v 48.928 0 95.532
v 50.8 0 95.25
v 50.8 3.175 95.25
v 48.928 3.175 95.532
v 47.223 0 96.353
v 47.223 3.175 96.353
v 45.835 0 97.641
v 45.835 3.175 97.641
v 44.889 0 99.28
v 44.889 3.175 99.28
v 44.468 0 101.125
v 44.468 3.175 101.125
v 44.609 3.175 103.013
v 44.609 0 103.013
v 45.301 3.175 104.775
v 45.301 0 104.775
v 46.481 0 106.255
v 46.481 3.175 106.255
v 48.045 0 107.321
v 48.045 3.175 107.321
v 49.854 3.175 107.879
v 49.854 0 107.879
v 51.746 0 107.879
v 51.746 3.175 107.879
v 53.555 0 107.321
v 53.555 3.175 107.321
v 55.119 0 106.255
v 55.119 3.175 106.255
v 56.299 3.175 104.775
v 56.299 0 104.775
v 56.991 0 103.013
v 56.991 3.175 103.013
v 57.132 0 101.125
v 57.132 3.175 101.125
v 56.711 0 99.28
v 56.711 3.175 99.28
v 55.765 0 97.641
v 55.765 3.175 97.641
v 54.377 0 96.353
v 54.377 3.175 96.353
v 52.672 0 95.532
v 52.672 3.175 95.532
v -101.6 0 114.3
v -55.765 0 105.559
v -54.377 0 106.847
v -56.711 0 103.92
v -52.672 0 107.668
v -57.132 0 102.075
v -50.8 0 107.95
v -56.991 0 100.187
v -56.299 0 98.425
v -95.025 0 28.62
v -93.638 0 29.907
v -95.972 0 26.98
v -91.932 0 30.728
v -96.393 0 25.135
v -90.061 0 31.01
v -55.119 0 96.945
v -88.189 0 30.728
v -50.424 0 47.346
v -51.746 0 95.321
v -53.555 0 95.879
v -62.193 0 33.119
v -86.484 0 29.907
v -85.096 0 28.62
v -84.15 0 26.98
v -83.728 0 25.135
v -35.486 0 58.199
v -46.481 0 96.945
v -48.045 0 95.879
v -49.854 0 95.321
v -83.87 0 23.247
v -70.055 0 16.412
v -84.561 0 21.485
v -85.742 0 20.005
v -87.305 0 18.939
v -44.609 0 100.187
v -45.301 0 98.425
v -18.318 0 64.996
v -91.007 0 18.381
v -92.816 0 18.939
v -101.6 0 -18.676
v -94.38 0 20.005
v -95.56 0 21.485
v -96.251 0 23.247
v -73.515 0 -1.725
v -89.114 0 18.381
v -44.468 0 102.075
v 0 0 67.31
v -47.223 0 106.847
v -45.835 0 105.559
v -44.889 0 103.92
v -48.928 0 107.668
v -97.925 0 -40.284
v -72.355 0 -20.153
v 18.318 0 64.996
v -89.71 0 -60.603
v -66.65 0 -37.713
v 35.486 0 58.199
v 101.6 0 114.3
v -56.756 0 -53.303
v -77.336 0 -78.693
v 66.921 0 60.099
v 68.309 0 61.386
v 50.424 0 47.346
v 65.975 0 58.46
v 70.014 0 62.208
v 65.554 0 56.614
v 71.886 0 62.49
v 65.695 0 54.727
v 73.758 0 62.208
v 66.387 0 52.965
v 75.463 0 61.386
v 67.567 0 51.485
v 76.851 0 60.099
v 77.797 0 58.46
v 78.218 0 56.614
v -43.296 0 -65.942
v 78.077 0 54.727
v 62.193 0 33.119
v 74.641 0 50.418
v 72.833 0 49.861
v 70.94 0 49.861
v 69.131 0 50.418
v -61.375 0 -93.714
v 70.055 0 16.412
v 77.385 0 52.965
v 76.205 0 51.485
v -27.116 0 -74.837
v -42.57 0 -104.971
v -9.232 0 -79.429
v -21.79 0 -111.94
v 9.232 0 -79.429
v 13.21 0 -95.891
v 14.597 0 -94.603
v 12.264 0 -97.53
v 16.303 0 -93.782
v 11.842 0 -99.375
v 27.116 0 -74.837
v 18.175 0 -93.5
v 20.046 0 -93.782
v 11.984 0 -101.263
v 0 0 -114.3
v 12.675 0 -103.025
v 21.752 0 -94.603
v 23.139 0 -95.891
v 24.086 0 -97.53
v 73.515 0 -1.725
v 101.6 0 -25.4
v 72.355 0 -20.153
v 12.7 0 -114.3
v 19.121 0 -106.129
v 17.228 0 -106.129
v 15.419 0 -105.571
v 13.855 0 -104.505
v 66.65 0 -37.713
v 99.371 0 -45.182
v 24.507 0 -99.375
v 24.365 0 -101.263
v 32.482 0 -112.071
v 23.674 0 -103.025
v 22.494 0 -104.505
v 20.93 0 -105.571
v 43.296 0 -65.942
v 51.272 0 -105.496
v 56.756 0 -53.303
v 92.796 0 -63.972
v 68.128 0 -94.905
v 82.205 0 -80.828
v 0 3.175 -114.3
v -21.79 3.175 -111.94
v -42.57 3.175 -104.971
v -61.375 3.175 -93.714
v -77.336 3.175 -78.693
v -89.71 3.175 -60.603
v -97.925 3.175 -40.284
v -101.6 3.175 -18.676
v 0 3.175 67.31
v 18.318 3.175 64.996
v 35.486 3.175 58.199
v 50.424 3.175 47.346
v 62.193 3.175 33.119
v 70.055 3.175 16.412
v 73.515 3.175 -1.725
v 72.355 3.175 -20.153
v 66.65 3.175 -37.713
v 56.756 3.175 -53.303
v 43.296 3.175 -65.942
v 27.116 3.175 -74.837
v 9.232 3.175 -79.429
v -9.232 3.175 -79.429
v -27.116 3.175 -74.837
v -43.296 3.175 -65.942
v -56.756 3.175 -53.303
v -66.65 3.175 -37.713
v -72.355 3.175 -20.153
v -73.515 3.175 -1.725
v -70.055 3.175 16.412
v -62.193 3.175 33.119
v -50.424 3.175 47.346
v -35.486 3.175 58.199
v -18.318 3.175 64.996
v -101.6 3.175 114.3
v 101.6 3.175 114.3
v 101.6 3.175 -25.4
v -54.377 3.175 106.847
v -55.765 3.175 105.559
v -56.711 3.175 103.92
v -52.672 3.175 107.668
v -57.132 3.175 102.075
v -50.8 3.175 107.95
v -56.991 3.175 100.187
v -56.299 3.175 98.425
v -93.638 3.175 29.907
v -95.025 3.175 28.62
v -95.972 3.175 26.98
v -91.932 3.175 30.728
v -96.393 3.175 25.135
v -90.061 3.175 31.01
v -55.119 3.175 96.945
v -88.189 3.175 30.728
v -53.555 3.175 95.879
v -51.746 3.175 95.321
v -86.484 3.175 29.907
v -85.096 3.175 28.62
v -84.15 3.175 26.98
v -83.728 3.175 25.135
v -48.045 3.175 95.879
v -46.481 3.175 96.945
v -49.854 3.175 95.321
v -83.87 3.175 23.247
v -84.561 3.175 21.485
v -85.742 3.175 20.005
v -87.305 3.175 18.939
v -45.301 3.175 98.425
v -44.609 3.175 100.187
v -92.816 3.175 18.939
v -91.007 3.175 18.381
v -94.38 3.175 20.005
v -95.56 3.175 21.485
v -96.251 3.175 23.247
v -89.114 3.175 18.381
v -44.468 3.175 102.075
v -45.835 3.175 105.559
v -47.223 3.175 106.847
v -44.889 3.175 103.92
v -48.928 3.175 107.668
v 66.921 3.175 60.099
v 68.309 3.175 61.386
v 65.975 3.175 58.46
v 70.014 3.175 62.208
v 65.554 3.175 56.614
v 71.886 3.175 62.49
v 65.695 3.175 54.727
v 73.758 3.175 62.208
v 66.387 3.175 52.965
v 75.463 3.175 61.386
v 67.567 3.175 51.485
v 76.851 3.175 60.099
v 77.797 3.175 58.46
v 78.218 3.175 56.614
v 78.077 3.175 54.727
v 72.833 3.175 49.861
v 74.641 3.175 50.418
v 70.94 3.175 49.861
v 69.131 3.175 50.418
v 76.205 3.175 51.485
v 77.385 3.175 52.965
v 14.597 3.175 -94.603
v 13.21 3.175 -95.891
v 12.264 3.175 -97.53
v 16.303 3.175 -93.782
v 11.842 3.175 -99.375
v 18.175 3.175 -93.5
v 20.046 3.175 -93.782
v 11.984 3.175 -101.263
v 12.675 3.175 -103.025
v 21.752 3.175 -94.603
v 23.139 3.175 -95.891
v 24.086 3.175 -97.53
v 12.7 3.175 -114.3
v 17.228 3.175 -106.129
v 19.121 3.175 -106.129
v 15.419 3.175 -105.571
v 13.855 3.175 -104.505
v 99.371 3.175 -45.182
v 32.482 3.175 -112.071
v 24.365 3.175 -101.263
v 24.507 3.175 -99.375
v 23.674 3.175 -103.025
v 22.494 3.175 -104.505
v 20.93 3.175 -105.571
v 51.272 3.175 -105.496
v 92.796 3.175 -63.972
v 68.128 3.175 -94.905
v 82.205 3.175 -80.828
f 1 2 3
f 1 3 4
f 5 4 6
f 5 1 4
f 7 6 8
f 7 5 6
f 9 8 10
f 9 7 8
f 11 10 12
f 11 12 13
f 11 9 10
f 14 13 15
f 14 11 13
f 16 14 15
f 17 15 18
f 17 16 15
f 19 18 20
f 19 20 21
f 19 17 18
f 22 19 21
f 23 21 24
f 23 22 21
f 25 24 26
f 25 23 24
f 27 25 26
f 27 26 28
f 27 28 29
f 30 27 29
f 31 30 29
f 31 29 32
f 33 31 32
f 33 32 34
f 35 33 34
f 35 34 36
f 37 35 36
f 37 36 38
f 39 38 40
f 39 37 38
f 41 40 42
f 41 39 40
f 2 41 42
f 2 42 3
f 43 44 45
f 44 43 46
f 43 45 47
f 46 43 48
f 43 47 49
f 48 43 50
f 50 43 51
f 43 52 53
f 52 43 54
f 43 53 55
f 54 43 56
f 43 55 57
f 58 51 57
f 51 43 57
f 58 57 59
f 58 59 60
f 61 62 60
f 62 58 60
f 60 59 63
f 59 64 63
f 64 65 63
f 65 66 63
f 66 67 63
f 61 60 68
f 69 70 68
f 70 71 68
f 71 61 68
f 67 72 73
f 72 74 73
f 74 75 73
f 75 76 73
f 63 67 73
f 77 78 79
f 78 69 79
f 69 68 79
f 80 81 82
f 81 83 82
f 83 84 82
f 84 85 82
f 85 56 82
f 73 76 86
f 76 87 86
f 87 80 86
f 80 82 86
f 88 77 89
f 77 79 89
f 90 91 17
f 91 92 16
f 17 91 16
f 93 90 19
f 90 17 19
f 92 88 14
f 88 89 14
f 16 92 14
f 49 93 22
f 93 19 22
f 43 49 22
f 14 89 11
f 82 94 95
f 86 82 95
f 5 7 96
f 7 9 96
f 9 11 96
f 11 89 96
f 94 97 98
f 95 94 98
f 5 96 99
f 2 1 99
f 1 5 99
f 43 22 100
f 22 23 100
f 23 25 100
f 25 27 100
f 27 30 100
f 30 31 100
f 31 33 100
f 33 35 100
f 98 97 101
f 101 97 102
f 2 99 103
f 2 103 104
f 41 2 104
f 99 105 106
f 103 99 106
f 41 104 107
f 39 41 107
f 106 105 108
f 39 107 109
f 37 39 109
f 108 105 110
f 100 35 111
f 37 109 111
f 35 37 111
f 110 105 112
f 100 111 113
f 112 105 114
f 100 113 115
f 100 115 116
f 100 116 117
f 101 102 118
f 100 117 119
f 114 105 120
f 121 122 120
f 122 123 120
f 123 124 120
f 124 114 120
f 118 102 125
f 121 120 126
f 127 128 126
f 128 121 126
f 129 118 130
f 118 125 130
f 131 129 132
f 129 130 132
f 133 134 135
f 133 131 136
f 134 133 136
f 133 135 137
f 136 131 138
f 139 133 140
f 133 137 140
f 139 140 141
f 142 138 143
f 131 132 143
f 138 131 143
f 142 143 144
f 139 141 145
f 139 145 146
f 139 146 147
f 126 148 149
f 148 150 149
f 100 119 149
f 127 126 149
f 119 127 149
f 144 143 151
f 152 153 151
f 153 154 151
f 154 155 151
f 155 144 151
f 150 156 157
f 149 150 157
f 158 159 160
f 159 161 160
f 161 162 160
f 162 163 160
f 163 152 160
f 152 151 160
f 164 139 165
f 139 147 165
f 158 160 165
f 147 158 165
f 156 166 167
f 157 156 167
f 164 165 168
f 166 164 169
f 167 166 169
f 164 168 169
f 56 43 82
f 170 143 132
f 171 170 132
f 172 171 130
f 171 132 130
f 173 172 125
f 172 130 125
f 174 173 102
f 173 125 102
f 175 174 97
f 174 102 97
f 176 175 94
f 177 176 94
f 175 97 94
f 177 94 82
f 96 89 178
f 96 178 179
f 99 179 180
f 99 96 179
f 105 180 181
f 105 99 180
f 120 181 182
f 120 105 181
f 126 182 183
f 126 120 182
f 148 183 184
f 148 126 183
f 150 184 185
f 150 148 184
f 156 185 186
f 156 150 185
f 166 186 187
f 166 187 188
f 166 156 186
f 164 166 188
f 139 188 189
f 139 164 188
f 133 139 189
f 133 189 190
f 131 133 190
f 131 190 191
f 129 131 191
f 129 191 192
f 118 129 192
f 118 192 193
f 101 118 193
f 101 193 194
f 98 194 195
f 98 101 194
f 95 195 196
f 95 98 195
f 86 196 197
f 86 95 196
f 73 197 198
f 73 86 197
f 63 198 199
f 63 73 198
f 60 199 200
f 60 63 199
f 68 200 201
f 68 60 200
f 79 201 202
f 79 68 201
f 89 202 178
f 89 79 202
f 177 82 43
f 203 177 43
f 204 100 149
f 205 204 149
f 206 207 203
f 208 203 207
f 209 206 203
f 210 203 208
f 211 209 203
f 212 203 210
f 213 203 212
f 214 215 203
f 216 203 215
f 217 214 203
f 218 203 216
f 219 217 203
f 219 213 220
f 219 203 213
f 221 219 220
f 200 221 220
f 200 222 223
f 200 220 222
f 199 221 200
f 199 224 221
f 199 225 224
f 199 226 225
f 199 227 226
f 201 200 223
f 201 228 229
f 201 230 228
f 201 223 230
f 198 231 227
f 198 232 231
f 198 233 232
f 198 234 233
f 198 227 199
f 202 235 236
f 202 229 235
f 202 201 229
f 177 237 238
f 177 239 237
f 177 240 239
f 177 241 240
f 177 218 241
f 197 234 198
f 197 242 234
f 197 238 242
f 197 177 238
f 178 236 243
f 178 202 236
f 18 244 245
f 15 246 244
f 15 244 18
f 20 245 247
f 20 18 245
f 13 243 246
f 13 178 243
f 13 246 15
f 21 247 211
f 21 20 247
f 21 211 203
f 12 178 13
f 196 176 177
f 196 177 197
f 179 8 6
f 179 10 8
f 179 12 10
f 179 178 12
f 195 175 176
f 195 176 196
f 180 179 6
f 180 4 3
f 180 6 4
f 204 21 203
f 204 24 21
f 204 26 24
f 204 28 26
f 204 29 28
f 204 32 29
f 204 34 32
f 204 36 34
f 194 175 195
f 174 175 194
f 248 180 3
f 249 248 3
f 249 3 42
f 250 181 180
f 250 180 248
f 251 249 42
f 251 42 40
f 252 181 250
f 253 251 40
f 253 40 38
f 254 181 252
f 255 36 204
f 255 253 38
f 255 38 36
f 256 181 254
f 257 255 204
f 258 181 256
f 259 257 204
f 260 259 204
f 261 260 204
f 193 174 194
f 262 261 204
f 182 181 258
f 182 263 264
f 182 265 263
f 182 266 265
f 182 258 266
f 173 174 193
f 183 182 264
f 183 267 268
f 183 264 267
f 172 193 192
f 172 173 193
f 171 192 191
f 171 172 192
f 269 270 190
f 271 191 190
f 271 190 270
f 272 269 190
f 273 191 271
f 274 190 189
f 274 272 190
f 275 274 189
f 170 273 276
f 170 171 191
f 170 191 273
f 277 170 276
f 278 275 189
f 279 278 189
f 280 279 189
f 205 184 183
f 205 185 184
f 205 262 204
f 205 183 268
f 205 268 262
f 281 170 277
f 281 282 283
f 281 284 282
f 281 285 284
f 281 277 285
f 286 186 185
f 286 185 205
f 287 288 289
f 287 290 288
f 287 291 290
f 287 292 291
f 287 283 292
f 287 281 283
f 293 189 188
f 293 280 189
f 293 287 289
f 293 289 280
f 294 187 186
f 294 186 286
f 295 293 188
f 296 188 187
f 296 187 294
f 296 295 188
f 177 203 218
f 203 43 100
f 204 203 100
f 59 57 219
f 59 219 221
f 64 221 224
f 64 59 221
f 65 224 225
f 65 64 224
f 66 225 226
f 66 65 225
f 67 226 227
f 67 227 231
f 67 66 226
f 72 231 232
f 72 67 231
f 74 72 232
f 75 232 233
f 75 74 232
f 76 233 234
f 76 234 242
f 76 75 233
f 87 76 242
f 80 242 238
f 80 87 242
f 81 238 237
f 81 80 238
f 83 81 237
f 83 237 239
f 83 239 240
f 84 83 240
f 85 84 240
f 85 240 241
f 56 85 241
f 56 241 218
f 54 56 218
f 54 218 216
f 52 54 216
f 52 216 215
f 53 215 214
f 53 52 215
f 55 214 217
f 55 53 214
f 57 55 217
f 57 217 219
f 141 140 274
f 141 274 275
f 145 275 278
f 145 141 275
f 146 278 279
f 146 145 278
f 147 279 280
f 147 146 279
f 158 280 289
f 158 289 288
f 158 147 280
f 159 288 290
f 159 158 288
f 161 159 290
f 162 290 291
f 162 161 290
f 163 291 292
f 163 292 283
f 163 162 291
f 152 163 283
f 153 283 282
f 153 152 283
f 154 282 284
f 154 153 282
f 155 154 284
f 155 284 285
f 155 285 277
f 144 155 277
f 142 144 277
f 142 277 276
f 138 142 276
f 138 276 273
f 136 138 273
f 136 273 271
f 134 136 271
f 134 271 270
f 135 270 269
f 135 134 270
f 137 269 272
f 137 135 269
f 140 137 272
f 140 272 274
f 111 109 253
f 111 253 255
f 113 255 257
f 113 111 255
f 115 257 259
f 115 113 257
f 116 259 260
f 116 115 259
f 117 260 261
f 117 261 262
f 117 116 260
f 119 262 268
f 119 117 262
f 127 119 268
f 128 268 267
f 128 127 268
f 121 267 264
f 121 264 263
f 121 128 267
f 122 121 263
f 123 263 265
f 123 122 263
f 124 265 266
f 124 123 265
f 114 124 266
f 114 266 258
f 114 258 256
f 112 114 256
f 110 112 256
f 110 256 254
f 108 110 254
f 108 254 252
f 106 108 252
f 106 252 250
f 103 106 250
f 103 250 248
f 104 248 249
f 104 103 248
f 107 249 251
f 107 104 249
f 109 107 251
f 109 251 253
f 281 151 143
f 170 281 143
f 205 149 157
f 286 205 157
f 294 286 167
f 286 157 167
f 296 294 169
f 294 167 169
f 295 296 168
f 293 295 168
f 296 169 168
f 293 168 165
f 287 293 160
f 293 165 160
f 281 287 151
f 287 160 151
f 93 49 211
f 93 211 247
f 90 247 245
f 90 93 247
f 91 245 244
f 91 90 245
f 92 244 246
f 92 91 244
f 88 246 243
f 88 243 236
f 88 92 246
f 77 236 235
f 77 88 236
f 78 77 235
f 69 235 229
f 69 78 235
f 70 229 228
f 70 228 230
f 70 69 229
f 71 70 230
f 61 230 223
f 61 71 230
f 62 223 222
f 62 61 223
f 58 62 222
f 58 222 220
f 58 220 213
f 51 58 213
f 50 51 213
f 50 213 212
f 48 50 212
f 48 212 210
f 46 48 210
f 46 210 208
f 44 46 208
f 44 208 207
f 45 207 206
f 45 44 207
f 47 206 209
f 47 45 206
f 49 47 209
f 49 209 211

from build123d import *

# Parameters (mm, degrees)
SKETCH1_R           = 73.66
SKETCH1_R_2         = 6.35
BOSS_EXTRUDE1_DEPTH = 3.175


with BuildPart() as part:
    # Sketch1 → Boss-Extrude1 (new body)
    with BuildSketch(Plane(origin=(0, 0, 0), x_dir=(1, 0, 0), z_dir=(0, 1, 0))):
        with BuildLine():
            Line((12.7, 114.3), (0, 114.3))
            ThreePointArc((0, 114.3), (-69.761055355, 86.634356609), (-101.6, 18.676470588))
            Line((-101.6, 18.676470588), (-101.6, -114.3))
            Line((-101.6, -114.3), (101.6, -114.3))
            Line((101.6, -114.3), (101.6, 25.4))
            ThreePointArc((101.6, 25.4), (75.561792847, 88.261792847), (12.7, 114.3))
        make_face()
        with Locations(Location((0, 6.35, 0), (0, 0, 270))):
            Circle(SKETCH1_R, mode=Mode.SUBTRACT)
        with Locations(Location((-90.060644326, -24.660366712, 0), (0, 0, 270))):
            Circle(SKETCH1_R_2, mode=Mode.SUBTRACT)
        with Locations(Location((-50.8, -101.6, 0), (0, 0, 270))):
            Circle(SKETCH1_R_2, mode=Mode.SUBTRACT)
        with Locations(Location((50.8, -101.6, 0), (0, 0, 90))):
            Circle(SKETCH1_R_2, mode=Mode.SUBTRACT)
        with Locations(Location((18.17455681, 99.849989223, 0), (0, 0, 270))):
            Circle(SKETCH1_R_2, mode=Mode.SUBTRACT)
        with Locations(Location((71.886087516, -56.139622511, 0), (0, 0, 270))):
            Circle(SKETCH1_R_2, mode=Mode.SUBTRACT)
    extrude(amount=BOSS_EXTRUDE1_DEPTH)


solid = part.part
